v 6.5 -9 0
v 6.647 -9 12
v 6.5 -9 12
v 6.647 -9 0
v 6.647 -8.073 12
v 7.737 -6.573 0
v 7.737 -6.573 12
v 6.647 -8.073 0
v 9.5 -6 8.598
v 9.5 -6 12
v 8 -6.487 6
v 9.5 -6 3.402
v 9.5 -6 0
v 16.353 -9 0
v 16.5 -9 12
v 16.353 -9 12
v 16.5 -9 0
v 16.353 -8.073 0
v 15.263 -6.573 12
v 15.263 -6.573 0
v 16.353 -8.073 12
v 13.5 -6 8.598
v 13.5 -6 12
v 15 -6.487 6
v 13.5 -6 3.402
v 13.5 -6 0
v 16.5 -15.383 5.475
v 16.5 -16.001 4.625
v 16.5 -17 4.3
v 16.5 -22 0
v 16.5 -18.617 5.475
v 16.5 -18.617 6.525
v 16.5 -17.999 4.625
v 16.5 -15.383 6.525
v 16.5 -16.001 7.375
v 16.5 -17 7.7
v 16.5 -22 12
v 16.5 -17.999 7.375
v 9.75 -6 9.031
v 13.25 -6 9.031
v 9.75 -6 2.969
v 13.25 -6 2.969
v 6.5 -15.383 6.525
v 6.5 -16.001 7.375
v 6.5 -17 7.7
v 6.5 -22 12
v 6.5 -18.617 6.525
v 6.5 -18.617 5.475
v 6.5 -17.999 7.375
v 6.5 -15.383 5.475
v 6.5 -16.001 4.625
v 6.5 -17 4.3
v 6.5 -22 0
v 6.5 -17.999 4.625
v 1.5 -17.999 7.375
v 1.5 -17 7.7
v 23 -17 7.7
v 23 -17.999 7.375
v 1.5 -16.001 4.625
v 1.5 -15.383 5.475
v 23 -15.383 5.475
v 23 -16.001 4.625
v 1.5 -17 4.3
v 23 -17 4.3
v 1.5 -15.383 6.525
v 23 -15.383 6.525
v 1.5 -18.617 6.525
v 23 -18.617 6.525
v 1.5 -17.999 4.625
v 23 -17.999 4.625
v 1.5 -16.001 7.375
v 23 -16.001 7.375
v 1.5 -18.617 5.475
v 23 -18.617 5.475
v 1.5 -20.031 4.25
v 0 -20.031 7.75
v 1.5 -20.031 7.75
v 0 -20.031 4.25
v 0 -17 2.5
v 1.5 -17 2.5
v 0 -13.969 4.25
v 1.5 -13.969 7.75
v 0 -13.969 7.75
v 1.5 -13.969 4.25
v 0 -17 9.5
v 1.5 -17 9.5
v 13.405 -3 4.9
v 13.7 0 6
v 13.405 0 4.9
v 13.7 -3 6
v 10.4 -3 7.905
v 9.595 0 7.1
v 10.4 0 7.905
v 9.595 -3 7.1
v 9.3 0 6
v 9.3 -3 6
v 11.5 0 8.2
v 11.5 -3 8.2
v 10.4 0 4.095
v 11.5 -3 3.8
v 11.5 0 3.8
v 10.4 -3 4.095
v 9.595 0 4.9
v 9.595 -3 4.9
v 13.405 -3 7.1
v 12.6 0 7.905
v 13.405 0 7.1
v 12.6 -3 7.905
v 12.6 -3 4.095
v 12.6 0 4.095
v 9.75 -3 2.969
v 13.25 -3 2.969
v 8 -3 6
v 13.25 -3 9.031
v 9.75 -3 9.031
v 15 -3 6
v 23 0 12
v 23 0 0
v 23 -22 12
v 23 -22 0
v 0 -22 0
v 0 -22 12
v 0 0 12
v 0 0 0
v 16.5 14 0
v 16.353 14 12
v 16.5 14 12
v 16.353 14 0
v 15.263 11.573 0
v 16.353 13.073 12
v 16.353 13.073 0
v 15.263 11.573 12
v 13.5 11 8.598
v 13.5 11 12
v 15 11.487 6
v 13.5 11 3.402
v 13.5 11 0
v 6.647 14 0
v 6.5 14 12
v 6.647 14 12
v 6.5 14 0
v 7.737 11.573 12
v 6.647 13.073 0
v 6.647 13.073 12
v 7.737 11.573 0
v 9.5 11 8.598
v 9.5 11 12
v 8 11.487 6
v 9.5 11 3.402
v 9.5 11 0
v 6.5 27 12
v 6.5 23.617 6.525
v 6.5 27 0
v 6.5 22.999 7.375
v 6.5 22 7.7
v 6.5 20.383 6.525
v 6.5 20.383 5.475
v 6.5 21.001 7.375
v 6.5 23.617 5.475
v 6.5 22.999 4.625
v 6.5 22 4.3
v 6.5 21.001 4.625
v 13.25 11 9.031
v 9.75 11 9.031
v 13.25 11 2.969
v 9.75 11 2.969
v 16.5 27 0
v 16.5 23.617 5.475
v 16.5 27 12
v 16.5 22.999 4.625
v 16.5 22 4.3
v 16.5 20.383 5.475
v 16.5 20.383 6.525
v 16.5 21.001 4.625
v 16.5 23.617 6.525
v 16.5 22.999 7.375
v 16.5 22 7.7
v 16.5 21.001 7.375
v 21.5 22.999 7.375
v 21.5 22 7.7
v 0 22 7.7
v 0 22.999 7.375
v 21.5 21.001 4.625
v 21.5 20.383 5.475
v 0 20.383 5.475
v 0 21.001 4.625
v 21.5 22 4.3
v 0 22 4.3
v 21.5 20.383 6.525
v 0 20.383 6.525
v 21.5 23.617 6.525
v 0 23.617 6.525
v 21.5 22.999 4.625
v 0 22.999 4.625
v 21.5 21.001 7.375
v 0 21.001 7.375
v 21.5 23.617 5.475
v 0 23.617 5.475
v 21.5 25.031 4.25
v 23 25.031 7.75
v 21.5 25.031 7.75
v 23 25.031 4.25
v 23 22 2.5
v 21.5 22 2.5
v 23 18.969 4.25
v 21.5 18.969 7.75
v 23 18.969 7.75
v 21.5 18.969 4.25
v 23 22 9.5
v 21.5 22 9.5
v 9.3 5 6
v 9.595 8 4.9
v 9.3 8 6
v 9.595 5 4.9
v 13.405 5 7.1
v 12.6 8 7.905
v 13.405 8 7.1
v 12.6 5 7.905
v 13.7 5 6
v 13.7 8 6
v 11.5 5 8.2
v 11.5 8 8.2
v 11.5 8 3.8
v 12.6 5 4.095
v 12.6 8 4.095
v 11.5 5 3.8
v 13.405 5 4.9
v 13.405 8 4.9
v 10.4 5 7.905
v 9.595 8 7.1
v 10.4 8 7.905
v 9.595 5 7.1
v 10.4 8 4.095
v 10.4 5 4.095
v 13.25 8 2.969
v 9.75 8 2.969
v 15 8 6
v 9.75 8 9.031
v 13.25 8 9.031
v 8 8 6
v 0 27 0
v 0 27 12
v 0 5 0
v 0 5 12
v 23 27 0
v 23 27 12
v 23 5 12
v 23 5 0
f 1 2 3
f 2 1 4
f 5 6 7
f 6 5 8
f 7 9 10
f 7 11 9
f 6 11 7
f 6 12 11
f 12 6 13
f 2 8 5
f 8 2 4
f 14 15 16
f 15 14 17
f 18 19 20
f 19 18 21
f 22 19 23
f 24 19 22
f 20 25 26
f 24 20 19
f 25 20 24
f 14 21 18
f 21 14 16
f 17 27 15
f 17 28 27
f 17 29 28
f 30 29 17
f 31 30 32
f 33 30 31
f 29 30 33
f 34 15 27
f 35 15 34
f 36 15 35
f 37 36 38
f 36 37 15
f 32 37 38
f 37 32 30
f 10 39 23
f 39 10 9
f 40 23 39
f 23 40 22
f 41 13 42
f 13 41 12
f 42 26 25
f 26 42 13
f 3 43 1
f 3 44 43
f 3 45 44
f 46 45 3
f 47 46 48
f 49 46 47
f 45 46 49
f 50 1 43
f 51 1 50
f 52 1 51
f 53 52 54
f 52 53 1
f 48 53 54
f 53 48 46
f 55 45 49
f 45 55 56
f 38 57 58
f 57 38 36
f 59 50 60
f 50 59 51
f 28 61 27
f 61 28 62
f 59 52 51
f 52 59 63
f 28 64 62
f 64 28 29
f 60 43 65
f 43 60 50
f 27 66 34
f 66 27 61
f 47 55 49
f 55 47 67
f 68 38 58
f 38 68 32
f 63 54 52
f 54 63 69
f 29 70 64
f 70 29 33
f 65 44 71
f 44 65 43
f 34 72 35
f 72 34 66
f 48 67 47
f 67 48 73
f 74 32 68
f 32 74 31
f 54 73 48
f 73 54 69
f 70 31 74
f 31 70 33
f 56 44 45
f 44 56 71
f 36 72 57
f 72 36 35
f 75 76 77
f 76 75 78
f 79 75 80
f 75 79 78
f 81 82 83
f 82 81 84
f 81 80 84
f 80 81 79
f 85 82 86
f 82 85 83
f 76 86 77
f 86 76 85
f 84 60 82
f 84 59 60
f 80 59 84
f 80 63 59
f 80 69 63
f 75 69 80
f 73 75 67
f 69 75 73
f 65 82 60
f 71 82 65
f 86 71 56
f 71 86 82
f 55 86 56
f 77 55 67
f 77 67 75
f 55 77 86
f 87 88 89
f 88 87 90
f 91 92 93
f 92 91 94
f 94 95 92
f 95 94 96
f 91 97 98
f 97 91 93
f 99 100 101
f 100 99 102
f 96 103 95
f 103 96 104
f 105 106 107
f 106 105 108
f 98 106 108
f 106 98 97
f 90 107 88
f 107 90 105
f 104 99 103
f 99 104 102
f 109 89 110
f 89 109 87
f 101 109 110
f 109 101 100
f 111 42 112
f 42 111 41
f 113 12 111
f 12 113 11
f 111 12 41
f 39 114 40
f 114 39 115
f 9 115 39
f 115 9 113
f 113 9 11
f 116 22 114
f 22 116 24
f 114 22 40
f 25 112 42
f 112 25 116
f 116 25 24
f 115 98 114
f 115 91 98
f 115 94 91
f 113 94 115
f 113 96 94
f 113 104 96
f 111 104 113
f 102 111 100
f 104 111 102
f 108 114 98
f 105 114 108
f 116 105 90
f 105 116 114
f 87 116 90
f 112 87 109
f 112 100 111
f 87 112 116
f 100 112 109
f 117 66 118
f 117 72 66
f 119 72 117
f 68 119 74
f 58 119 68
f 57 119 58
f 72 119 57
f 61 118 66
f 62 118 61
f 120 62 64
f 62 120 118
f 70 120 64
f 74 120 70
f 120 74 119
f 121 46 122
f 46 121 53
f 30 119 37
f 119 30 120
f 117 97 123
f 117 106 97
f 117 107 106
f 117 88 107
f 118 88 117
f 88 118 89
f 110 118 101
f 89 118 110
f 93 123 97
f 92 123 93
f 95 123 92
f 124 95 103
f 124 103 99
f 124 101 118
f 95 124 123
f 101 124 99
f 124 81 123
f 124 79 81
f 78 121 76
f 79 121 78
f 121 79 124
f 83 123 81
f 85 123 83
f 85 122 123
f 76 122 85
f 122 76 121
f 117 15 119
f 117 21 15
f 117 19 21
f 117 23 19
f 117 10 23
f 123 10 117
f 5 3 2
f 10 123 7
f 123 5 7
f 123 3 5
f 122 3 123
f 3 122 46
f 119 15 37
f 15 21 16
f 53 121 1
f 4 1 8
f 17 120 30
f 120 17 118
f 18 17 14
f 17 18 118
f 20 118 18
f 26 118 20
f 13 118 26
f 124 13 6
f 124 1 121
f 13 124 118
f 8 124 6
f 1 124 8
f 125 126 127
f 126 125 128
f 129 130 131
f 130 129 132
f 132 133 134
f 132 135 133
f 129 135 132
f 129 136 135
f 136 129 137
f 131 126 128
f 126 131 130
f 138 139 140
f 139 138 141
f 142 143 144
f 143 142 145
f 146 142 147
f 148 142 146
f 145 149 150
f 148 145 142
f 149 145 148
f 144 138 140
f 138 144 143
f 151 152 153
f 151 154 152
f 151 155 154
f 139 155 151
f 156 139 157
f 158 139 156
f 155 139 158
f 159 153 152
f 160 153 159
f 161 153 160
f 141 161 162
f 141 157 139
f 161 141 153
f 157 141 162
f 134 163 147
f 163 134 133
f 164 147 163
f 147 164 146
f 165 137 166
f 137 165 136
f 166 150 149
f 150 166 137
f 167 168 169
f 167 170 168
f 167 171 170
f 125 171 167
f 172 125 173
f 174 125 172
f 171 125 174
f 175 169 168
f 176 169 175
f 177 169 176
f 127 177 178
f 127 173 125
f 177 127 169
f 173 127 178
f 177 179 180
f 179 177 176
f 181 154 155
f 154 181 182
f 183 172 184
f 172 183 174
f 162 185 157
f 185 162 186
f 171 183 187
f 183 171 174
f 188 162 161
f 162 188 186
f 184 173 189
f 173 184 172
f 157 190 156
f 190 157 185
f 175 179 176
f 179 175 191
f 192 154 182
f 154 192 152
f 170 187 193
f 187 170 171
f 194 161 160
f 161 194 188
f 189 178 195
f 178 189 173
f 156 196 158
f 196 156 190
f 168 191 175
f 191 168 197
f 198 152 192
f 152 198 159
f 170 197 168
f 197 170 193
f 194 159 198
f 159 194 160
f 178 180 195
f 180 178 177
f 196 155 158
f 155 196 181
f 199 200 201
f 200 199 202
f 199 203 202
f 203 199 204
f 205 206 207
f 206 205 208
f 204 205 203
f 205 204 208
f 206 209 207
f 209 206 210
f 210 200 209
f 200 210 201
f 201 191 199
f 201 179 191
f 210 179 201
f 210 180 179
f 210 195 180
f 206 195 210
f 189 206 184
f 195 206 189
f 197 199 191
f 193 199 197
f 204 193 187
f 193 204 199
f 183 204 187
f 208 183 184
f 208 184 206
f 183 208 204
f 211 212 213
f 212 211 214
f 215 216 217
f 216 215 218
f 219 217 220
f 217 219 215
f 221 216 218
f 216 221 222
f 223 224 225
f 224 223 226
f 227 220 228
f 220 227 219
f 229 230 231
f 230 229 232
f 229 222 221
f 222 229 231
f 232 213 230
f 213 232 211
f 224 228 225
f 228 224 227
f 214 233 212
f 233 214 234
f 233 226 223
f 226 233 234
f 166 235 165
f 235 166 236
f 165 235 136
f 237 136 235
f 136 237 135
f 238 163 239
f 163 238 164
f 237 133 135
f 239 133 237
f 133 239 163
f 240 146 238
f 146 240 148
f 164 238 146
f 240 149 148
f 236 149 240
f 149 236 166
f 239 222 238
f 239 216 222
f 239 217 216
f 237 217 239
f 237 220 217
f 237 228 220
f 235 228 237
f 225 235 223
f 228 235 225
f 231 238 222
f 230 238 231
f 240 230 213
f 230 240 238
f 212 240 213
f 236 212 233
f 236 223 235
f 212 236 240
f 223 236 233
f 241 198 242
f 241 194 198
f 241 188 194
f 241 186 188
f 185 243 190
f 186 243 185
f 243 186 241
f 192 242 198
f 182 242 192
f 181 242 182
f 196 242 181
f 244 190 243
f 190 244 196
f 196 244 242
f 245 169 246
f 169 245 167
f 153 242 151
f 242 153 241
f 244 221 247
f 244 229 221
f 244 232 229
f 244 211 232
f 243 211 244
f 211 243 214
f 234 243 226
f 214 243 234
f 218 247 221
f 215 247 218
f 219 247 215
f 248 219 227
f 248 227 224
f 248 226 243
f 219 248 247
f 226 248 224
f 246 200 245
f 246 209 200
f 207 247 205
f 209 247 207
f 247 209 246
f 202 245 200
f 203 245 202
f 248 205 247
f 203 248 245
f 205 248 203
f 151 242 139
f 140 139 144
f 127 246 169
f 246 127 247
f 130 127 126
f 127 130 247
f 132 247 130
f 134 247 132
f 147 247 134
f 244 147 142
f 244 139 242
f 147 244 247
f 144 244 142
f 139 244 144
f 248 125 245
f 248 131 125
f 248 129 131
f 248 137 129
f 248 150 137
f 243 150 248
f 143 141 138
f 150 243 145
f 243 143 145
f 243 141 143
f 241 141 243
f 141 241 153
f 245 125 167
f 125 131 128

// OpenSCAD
// file: inc/funciones.scad
// Nueva impresora by Chema <josema@pentabyte.es>
// Funciones que se usan en otros archivos
// GNU GPL v3
// Mod from
// Josef Průša <josefprusa@me.com>
// Václav 'ax' Hůla <axtheb@gmail.com>
// Vlnofka <>
// http://www.reprap.org/wiki/Prusa_Mendel
// http://github.com/prusajr/PrusaMendel

module screw(h=20, r=2, r_head=3.5, head_drop=0, slant=true, poly=false, $fn=0, $fnn=0){
    //makes screw with head
    //for substraction as screw hole
    if (poly) {
        cylinder_poly(h=h, r=r, $fn=$fn);
    } else {
        cylinder(h=h, r=r, $fn=$fn);
    }
    if (slant) {
		if($fnn == 0) {
		translate([0, 0, head_drop-0.01]) cylinder(h=r_head, r2=0, r1=r_head, $fn=$fn);
		}else{
        translate([0, 0, head_drop-0.01]) cylinder(h=r_head, r2=0, r1=r_head, $fn=$fnn);
		}
    }

    if (head_drop > 0) {
		if($fnn == 0) {
        translate([0, 0, -0.01]) cylinder(h=head_drop+0.01, r=r_head, $fn=$fn);
		}else{
		translate([0, 0, -0.01]) cylinder(h=head_drop+0.01, r=r_head, $fn=$fnn);
		}
    }
}

module nema17(places=[1,1,1,1], size=15.5, h=10, holes=false, polea=false, shaft=true, shadow=false, $fn=24){
    for (i=[0:3]) {
        if (places[i] == 1) {
            rotate([0, 0, 90*i]) translate([size, size, 0]) {
                if (holes) {
                    #rotate([0, 0, -90*i])  translate([0,0,-h]) screw(r=1.7, slant=false, head_drop=13, $fn=$fn, h=h+12);
                } else {
                    //rotate([0, 0, -90*i]) cylinder(h=h, r=5.5, $fn=$fn);
                }
            }
        }
    }
    if (shadow != false) {
        translate ([0, 0, shadow+21+3]) cube_fillet([42,42,42], center = true);
    //flange
        translate ([0, 0, shadow+21+3-21-1]) cylinder(r=11,h=2, center = true, $fn=20);
     }

	if (polea != false) {
	translate ([0,0,-4-4]) cylinder(r=polea/2,h=16,center=true);
	translate ([0,0,-4-12]) cylinder(r=(polea/2)+2,h=1,center=true);
	translate ([0,0,-4-12+10]) cylinder(r=(polea/2)+2,h=1,center=true);
	}
	
	if(shaft){
   //shaft
        translate ([0, 0, shadow+21+3-21-7-5]) cylinder(r=2.5,h=24, center = true);
	}


}

module polea(diam=12,alto=9,imp=false){

  if(imp){
	difference(){
		union(){
		 cylinder(r=diam/2+0.3,h=alto/2,center=true);
		translate ([0,0,-alto/4]) 
		 cylinder(r=(diam/2)+2,h=1,center=true);
//		translate ([0,0,alto/2]) 
//		 cylinder(r=(diam/2)+2,h=1,center=true);
		}
	 translate ([0,0,alto/4-1.5])
	 cylinder(r=623_od/2+0.3,h=alto/2,center=true);
	 #cylinder(r=623_od/2-1,h=100,center=true);
	}
  }else{
	difference(){
		union(){
		 cylinder(r=diam/2,h=alto,center=true);
		translate ([0,0,-alto/2]) 
		 cylinder(r=(diam/2)+2,h=1,center=true);
		translate ([0,0,alto/2]) 
		 cylinder(r=(diam/2)+2,h=1,center=true);
		}
	 cylinder(r=1.6,h=100,center=true);
	}
  }	
}

module nut(d,h,horizontal=true){
    cornerdiameter =  (d / 2) / cos (180 / 6);
    cylinder(h = h, r = cornerdiameter, $fn = 6);
    if(horizontal){
        for(i = [1:6]){
            rotate([0,0,60*i]) translate([-cornerdiameter-0.2,0,0]) rotate([0,0,-45]) cube([2,2,h]);
        }
    }
}

// Based on nophead research
module polyhole(d, h, center=false) {
    n = max(round(2 * d),3);
    rotate([0,0,180])
        cylinder(h = h, r = (d / 2) / cos (180 / n), $fn = n);
}

// make it interchangeable between this and cylinder
module cylinder_poly(r, h, center=false){
    polyhole(d=r*2, h=h, center=center);
}

module fillet(radius, height=100, $fn=0) {
    //this creates actal fillet
	if (radius > -0.0001){
	    translate([-radius, -radius, -height/2-0.01])
	        difference() {
	            cube([radius*2, radius*2, height+0.02]);
	            cylinder(r=radius, h=height+0.02, $fn=$fn);
	        }
	}else{
	    //translate([-radius/2, -radius/2, -height/2-0.01])
		translate([0, 0, -height/2-0.01])
	        union() {
	            cube([-radius*2, -radius*2, height+0.02]);
	            cylinder(r=-radius, h=height+0.02, $fn=$fn);
	        }
	
		}
}

module cube_fillet(size, radius=-1, vertical=[3,3,3,3], top=[0,0,0,0], bottom=[0,0,0,0], center=false, $fn=0){
    //
    if (center) {
        cube_fillet_inside(size, radius, vertical, top, bottom, $fn);
    } else {
        translate([size[0]/2, size[1]/2, size[2]/2])
            cube_fillet_inside(size, radius, vertical, top, bottom, $fn);
    }
}

module cube_negative_fillet(size, radius=-1, vertical=[3,3,3,3], top=[0,0,0,0], bottom=[0,0,0,0], $fn=0){

    j=[1,0,1,0];

    for (i=[0:3]) {
        if (radius > -1) {
            rotate([0, 0, 90*i]) translate([size[1-j[i]]/2, size[j[i]]/2, 0]) fillet(radius, size[2], $fn=$fn);
        } else {
            rotate([0, 0, 90*i]) translate([size[1-j[i]]/2, size[j[i]]/2, 0]) fillet(vertical[i], size[2], $fn=$fn);
			
        }
        rotate([90*i, -90, 0]) translate([size[2]/2, size[j[i]]/2, 0 ]) fillet(top[i], size[1-j[i]], $fn=$fn);
        rotate([90*(4-i), 90, 0]) translate([size[2]/2, size[j[i]]/2, 0]) fillet(bottom[i], size[1-j[i]], $fn=$fn);

    }
}



module cube_fillet_inside(size, radius=-1, vertical=[3,3,3,3], top=[0,0,0,0], bottom=[0,0,0,0], $fn=0){
    //makes CENTERED cube with round corners
    // if you give it radius, it will fillet vertical corners.
    //othervise use vertical, top, bottom arrays
    //when viewed from top, it starts in upper right corner (+x,+y quadrant) , goes counterclockwise
    //top/bottom fillet starts in direction of Y axis and goes CCW too


    if (radius == 0) {
        cube(size, center=true);
    } else {
        difference() {
            cube(size, center=true);
            cube_negative_fillet(size, radius, vertical, top, bottom, $fn);
        }
    }
}

module pushfit_rod(diameter,length){
 cylinder(h = length, r=diameter/2, $fn=30);
 translate(v=[0,-diameter/4,length/2]) cube(size = [diameter,diameter/2,length], center = true);
 translate(v=[0,-diameter/2-2,length/2]) cube(size = [diameter,1,length], center = true);
}

module brida(w=4,h=2.5,r=10,size=[0,0,0]){
	difference(){
		resize(size)
	     cylinder(h = w, r=r+h, $fn=50, center=true);
	   	resize(size-[h,h,0])
	     cylinder(h = w*2, r=r, $fn=50, center=true);
	  }
}

module fija_correa(){
 difference(){
	union(){
		translate([0,0,(grueso_fijacion+fge)/2])
		cube([ancho_fijacion-3,(largo_fijacion/2-red_fijacion)*2,grueso_fijacion+fge],center=true);
		if(brimw>0){
			cube([ancho_fijacion-3+2*brimw,(largo_fijacion/2-red_fijacion)*2+2*brimw,brimh],center=true);
			for(i=[-1,1]){
				translate([i*(ancho_fijacion-2)/2,0,0])
				cylinder(r=largo_fijacion/2-red_fijacion+brimw,h=brimh,$fn=25,center=true);
			}
		}
		for(i=[-1,1]){
			translate([i*(ancho_fijacion-4)/2,0,(grueso_fijacion+fge)/2])
			cylinder(r=largo_fijacion/2-red_fijacion,h=grueso_fijacion+fge,$fn=25,center=true);
		}
	} //fin union

	// hueco correa
	translate([-belt_ancho/2-1,largo_fijacion,grueso_fijacion]) rotate([90,0,0])
	cube([belt_ancho+2,largo_fijacion,20]);

	//agujeros tornillos
	translate([ancho_fijacion/2,0,-largo_fijacion+2])
	screw(r=m3_diameter/2, slant=false, head_drop=0, h=50, $fn=15);
	translate([-ancho_fijacion/2,0,-largo_fijacion+2])
	screw(r=m3_diameter/2, slant=false, head_drop=0, h=50, $fn=15);

	//dientes fijación correa
 	for ( i = [0 : 33] ){
   		translate([-belt_ancho/2-1,25-i*belt_tooth_distance,grueso_fijacion-belt_grueso]) 
		 cube([belt_ancho+2,1.2,3]);
	}
 

 } //fin difference
}

module barrasX(longitud=100){
	cylinder(r=4,h=longitud);
	translate([-x_rod_distance,0,0])
	cylinder(r=4,h=longitud);
}
// file: inc/metric.scad
// PRUSA Mendel  
// Default metric sizes
// GNU GPL v2
// Josef Průša
// josefprusa@me.com
// prusadjs.cz
// http://www.reprap.org/wiki/Prusa_Mendel
// http://github.com/prusajr/PrusaMendel

// DONT CHANGE THIS FILE! ALTER VALUES IN CONFIGURATION.SCAD INSTEAD

// RODS

threaded_rod_diameter = 8 + margen;
threaded_rod_diameter_horizontal = 8 + margen;
smooth_bar_diameter = 8 + margen/2;
smooth_bar_diameter_horizontal = 8 + margen/2;

// Nuts and bolts

m8_diameter = 8 + margen; //8mm
m8_nut_diameter = 15 + margen; //15mm (diámetro) || 13mm (entre caras)
m8_nut_size = 13 + margen;

m5_diameter = 5 + margen; //5mm
m5_nut_diameter = 9.24 + margen; //9.24mm (diámetro) || 8mm (entre caras)
m5_nut_size = 8 + margen;

m4_diameter = 4 + margen; //4mm
m4_nut_diameter = 8.08 + margen; //8.08mm (diámetro) || 7mm (entre caras)
m4_nut_size = 7 + margen;

m3_diameter = 3 + margen; //3mm
m3_nut_diameter = 6.35 + margen; //6.35mm (diámetro) || 5.5mm (entre caras)
m3_nut_size = 5.5 + margen;

// Bushing holder

bushing_core_diameter = smooth_bar_diameter;
bushing_material_thickness = 1;

// Motors

motor_shaft = 5 + margen;
// file: inc/config.scad
// New Printer by Chema
// GNU GPL v3

// Mod basado en
// Josef Průša
// josefprusa@me.com
// prusadjs.cz
// http://www.reprap.org/wiki/Prusa_Mendel
// http://github.com/prusajr/PrusaMendel

margen=0.2; //margen en diámetro para los agujeros
brimh=0.4; //altura de capa para brim
brimw=0; //cuanto brim (5)

// Extremos eje Y
altura = 20; //original 40
fondo = 22;
ancho = 18;
bajos = 6;

grueso=5;

//Carro Y
	yc_alto=19; //33-10-6+2;
	
	yc_ancho=35+8;
	sep_pol=24; //separación entre ejes de poleas
	sep_polea=24;
	yc_largo=sep_pol+10;
	
	//altura polea respecto barra superior
	//pos barra altura-2 del motor
	//pos polea (shaft motor 24mm, polea 18mm alto) 6mm sobre motor (+-2mm)
	//espacio para polea (altura) = 12-14mm
	
	//x_rod_distance = (altura-2+grueso-yc_alto)*2; //29.25*2;
	//x_rod_distance = 29.25*2-10;
	x_rod_distance = 31+10; //separación de barras eje X
	y_rod_distance = 55; //separación de barras eje Y (en caso de dos barras) Obsoleto
	diam_x=8.1; //Diámetro de la barra lisa del eje X 8.1 PLA, 8.4 ABS
	belt_space=10; //paso para las correas


bearing_diameter = 10+margen; //diámetro de los cojinetes lineales
thinwall = 2+1; //pared en los cojinetes
bearing_size = bearing_diameter + 2 * thinwall;

sep_tensor=18.5-2; //espacio entre el eje del tensor y la barra lisa eje Y

//Medidas bearing 623
623_id=3;
623_od=10;
623_h=4;

//Carro X
	xc_largo=40; //largo del carro X
	//xc_ancho=altura-2+grueso-yc_alto;
	xc_ancho=sep_pol; //espacio entre ejes poleas en carro Y (==ancho carro X)
	//fijaciones correa carro X
	grueso_fijacion=4; //este grueso incluye el grosor de la correa (0.75mm para GT2==belt_grueso)
	ancho_fijacion=12; //entre centros de los agujeros
	largo_fijacion=10; 
	red_fijacion=0.4; //cuanto más pequeña es la fijación con respecto a su hueco en el carro X
	fge=1.0; //grueso extra de la fijación correa
	tbf=3.5; //espacio entre fijación y su tuerca

// Carro Z
	rfn=true; //¿lleva refuerzo?
	grm=6; //grosor material refuerzo
	sep_z=150; //separación entre las barras
	fromw=29.5; //separación barra lisa de la pared
	cz_fondo=20; //fondo del carro Z
	cz_alto=50;
	cz_largo=sep_z+20;
	 esp=6/2; //la mitad del espesor que queremos en la viga
	 cur=cz_fondo/2-esp;
	longZ=310; //longitud del eje Z (esto se ha de poder variar)

// PLEASE SELECT ONE OF THE CONFIGURATIONS BELOW
// BY UN-COMMENTING IT

// Uncomment for metric settings
// METRIC METRIC METRIC METRIC METRIC METRIC METRIC METRIC 

include <metric.scad>;

// Uncomment for imperial settings
// IMPERIAL IMPERIAL IMPERIAL IMPERIAL IMPERIAL IMPERIAL IMPERIAL 

//include <sae.scad>;

// LM8UU
linear = false;


// CHANGE ONLY THE STUFF YOU KNOW
// IT WILL REPLACE DEFAULT SETTING

// RODS

// threaded_rod_diameter = 0;
// threaded_rod_diameter_horizontal = 0;
// smooth_bar_díameter = 0;
// smooth_bar_díameter_horizontal = 0;

// Nuts and bolts

// m8_diameter = 0;
// m8_nut_diameter = 0;

// m4_diameter = 0;
// m4_nut_diameter = 0;

// m3_diameter = 0;
// m3_nut_diameter = 0;

// Bushing holder

// bushing_core_diameter = smooth_bar_díameter;
// bushing_material_thickness = 0;


///counted stuff
m3_nut_diameter_bigger = ((m3_nut_diameter  / 2) / cos (180 / 6))*2;
m5_nut_diameter_bigger = ((m5_nut_diameter  / 2) / cos (180 / 6))*2;

// funciones 
include <funciones.scad>


// Select your belt type ******************************************************

//T2.5
//belt_tooth_distance = 2.5;
//belt_tooth_ratio = 0.5;

//T5 (strongly discouraged)
//belt_tooth_distance = 5;
//belt_tooth_ratio = 0.75;

//HTD3
//belt_tooth_distance = 3;
//belt_tooth_ratio = 0.75;

//MXL
//belt_tooth_distance = 2.032;
//belt_tooth_ratio = 0.64;

//GT2
belt_tooth_distance = 2;
belt_tooth_ratio = 0.5;
belt_grueso = 0.75;
belt_ancho = 6;
// main file
// New printer MOD by Chema

// Y tension prototype V2
// GNU GPL v3

include<inc/config.scad>

impresion=true;

ytens_alto=15+5+2;
ytens_ancho=23;
ytens_largo=12;

module y_tens_base(){
	// Bloque
	translate([0,0,0]) 
	 cube(size = [ytens_ancho,ytens_largo,ytens_alto], center=false);
	if(brimw>0){
		translate([-brimw,0,-brimw]) 
		 cube(size = [ytens_ancho+brimw*2,brimh,ytens_alto+brimw*2], center=false);
	
	}
	//refuerzo
//	translate([0,ytens_largo/2,0])
//	rotate([0,90,0])
//	cylinder(r=ytens_largo/2,h=ytens_ancho);

}

module y_tens_holes(){
	//general
	//translate([5,(ytens_largo-50)/2,5])
	translate([ytens_ancho/2,ytens_largo/2+(brimw>0?1+brimh:0),ytens_alto/2+5+1])
	cube_fillet([13-3,ytens_largo+2,ytens_alto], vertical=[0,0,0,0], bottom=[0,3,0,3], center=true);

	//screws poleas 
//	translate ([ytens_ancho+0.5,ytens_largo/2,ytens_alto-5]) rotate ([0,-90,0]) 
//	 screw(r=m3_diameter/2+0.1, slant=false, head_drop=2, h=50, $fn=10);
	translate ([-0.5,ytens_largo/2,ytens_alto-5]) rotate ([-90,0,-90]) 
	 screw(r=m3_diameter/2+0.1, slant=false, head_drop=2, h=48, $fnn=6, $fn=10);

	//screws tensor
	translate ([ytens_ancho/2,ytens_largo/2,6+2]) rotate ([0,180,0]) 
	 screw(r=m4_diameter/2+0.1, slant=false, head_drop=3+2, h=50, $fnn=6,$fn=12);
//	translate ([ytens_ancho/2,5,6]) rotate ([0,180,0]) 
//	 screw(r=m3_diameter/2+0.1, slant=false, head_drop=3, h=50, $fn=6);


}


// Final prototype
module y_tens(){
 difference(){
  y_tens_base();
  y_tens_holes();
 }
//polea
 if(impresion==false){
	translate([ytens_ancho/2,ytens_largo/2,ytens_alto-5])
	rotate([0,90,0])
	polea(diam=12,alto=8);
 }
}

if (impresion){
	//y_tens();
	rotate([90,0,0]){ //para mejorar la impresión
	y_tens();
	 rotate([0,180,0])
	translate([-ytens_ancho,0,5+brimw*2])
	y_tens();
	
//	translate([ytens_ancho/2,ytens_largo/2,ytens_alto-5])
//	rotate([0,90,0])
//	polea();
	
	}
}
